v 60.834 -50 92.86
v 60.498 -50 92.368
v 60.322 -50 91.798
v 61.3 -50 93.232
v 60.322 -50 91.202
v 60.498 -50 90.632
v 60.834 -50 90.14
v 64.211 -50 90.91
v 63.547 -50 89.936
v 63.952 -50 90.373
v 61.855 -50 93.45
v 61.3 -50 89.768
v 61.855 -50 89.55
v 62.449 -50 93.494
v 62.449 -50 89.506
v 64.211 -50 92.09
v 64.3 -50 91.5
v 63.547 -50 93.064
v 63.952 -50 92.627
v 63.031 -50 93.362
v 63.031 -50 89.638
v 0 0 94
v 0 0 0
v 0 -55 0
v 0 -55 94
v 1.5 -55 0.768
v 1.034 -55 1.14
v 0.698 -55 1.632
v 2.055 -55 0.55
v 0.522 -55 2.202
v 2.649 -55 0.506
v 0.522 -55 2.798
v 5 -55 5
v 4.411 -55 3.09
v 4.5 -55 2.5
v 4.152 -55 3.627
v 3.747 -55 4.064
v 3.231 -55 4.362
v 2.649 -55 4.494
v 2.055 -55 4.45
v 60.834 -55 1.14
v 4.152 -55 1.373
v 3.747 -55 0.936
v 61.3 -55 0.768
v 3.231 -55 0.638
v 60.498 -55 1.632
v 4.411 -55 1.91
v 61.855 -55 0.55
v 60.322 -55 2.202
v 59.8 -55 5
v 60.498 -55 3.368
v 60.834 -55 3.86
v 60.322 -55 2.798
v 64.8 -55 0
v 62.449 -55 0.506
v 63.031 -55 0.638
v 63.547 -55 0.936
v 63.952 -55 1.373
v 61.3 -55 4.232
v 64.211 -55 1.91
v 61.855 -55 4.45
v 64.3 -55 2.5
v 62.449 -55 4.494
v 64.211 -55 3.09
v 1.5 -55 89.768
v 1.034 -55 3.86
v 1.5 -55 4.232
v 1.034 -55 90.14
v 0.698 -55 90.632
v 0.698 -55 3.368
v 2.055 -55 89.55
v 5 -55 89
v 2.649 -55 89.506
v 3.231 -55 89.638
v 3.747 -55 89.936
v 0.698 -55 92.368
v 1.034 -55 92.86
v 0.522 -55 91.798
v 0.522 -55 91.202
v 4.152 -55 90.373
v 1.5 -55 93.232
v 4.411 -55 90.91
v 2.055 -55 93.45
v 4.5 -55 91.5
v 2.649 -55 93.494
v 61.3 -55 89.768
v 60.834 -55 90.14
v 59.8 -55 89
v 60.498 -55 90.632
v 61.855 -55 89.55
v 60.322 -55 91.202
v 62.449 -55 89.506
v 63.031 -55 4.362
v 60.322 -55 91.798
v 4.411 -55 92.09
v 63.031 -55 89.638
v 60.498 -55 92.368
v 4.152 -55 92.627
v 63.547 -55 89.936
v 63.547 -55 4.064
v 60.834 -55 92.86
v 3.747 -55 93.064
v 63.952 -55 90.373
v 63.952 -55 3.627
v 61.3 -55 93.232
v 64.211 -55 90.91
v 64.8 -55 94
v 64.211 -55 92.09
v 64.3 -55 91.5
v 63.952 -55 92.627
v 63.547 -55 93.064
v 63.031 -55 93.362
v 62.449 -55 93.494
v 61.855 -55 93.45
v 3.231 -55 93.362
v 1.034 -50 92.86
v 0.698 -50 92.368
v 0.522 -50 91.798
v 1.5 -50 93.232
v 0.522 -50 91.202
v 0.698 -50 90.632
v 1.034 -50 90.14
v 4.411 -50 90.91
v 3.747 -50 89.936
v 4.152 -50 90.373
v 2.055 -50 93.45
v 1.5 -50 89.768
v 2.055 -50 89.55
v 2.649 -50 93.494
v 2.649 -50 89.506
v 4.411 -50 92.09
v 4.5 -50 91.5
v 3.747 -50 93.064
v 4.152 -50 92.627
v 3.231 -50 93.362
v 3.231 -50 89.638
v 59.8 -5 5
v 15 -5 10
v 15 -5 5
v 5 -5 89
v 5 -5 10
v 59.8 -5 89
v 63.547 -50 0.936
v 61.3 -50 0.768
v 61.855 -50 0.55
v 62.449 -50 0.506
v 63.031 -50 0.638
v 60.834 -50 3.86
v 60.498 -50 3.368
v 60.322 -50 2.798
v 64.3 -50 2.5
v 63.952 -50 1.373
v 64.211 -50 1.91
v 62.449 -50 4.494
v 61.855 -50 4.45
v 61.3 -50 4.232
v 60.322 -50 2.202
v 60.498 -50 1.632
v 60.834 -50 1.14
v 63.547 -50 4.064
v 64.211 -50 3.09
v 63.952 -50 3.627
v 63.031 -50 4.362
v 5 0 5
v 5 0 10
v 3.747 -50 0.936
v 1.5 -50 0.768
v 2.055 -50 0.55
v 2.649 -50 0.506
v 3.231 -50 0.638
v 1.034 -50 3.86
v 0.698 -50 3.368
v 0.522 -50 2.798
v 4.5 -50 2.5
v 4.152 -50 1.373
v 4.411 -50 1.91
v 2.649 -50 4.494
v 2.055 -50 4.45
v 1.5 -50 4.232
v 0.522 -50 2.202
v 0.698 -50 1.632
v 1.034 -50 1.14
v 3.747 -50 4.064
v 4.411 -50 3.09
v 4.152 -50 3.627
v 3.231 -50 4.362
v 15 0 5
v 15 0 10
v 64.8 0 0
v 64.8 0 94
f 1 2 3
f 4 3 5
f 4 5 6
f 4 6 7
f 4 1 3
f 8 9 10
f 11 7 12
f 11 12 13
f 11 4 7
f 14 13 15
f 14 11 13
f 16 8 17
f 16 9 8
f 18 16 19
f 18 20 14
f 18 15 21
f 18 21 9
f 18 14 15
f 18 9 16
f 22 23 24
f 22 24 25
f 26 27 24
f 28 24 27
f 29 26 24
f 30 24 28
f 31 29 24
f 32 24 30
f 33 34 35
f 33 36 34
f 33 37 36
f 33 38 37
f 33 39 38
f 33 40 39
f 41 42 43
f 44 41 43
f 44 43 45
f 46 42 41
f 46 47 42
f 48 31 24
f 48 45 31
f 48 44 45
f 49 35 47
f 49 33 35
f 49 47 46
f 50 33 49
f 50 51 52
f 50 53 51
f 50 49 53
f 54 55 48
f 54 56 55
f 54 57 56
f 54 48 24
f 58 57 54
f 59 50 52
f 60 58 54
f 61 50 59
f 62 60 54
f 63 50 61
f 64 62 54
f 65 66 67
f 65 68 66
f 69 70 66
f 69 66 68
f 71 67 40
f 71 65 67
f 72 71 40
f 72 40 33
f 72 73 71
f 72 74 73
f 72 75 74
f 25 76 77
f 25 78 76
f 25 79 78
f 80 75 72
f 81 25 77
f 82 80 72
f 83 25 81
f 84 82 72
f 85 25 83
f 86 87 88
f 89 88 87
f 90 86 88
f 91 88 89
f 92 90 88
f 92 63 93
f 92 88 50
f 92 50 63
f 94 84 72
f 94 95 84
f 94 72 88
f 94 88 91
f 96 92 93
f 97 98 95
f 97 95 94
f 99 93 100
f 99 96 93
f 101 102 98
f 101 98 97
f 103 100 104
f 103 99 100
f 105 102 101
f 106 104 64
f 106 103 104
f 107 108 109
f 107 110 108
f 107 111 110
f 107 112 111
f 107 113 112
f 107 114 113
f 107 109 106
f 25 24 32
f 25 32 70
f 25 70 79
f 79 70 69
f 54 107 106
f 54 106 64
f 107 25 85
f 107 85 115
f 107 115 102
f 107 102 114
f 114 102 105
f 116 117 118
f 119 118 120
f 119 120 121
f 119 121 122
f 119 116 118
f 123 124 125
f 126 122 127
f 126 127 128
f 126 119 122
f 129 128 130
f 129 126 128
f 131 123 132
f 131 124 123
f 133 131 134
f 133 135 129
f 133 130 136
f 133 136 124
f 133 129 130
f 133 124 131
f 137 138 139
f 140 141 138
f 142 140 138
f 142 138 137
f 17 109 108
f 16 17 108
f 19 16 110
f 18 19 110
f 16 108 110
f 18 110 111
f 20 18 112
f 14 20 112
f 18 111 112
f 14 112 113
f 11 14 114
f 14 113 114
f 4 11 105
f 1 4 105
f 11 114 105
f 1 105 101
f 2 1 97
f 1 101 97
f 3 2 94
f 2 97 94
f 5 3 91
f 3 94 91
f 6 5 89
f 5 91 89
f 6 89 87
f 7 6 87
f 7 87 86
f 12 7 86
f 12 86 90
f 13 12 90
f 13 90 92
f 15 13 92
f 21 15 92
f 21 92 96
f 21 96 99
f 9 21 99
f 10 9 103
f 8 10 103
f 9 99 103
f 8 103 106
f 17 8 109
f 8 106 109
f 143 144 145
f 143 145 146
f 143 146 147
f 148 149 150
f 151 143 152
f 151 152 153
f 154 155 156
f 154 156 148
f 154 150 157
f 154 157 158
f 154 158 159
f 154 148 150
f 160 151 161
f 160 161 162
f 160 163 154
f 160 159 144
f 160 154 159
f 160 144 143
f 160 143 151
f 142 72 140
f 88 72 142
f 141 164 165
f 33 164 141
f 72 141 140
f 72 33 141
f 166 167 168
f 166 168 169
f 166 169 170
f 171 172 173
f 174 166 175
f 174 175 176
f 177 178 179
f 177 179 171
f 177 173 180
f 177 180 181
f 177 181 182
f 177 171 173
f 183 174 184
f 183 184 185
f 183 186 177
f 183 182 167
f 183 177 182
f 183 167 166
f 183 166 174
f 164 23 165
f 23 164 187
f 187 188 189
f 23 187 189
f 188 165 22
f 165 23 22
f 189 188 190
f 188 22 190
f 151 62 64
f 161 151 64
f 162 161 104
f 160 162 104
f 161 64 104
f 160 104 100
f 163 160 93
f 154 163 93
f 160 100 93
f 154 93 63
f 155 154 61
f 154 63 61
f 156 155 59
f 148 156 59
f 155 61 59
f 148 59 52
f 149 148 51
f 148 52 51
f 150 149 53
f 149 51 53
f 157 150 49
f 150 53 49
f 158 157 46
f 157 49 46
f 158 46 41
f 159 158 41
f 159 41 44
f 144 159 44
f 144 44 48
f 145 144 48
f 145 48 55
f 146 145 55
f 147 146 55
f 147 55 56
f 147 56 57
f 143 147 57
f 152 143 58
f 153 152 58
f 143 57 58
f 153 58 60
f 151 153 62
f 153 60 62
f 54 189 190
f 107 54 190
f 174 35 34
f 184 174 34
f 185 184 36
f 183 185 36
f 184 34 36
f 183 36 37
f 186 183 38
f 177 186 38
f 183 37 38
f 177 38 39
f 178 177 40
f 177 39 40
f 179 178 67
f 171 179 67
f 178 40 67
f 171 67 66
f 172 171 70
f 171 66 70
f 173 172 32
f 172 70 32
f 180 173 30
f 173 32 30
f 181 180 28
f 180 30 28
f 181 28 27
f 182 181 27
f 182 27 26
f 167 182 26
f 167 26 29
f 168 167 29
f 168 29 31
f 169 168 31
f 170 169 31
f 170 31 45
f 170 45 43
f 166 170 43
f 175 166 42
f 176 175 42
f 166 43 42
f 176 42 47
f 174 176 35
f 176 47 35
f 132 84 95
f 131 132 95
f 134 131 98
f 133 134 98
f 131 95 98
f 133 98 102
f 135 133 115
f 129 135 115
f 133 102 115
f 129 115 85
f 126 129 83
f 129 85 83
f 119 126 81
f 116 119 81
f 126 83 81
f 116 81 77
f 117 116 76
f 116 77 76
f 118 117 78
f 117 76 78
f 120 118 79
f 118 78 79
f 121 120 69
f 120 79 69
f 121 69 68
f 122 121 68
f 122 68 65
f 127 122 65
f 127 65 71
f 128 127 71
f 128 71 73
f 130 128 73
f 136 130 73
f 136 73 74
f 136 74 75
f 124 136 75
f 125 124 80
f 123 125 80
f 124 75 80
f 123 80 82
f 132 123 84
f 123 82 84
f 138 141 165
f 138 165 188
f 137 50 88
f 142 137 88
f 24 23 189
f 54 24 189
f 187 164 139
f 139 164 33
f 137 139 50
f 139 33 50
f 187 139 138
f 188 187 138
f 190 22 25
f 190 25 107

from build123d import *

# Parameters (mm, degrees)
SKETCH_W        = 64.8
SKETCH_H        = 94
PAD_DEPTH       = 55
SKETCH001_W     = 54.8
SKETCH001_H     = 84
POCKET_DEPTH    = 50
SKETCH002_R     = 2
POCKET001_DEPTH = 5
SKETCH003_W     = 10
SKETCH003_H     = 5
POCKET002_DEPTH = 5.001


with BuildPart() as part:
    # Sketch → Pad (new body)
    with BuildSketch(Plane.XZ):
        with Locations((32.4, 47)):
            Rectangle(SKETCH_W, SKETCH_H)
    extrude(amount=PAD_DEPTH)

    # Sketch001 (on Face6 of Pad) → Pocket (cut)
    with BuildSketch(Plane.XZ.offset(55)):
        with Locations((32.4, 47)):
            Rectangle(SKETCH001_W, SKETCH001_H)
    extrude(amount=-POCKET_DEPTH, mode=Mode.SUBTRACT)

    # Sketch002 (on Face5 of Pocket) → Pocket001 (cut)
    with BuildSketch(Plane.XZ.offset(55)):
        with Locations((2.5, 2.5)):
            Circle(SKETCH002_R)
        with Locations((62.3, 2.5)):
            Circle(SKETCH002_R)
        with Locations((62.3, 91.5)):
            Circle(SKETCH002_R)
        with Locations((2.5, 91.5)):
            Circle(SKETCH002_R)
    extrude(amount=-POCKET001_DEPTH, mode=Mode.SUBTRACT)

    # Sketch003 (on Face18 of Pocket001) → Pocket002 (cut, through all)
    with BuildSketch(Plane.XZ.offset(5)):
        with Locations((10, 7.5)):
            Rectangle(SKETCH003_W, SKETCH003_H)
    extrude(amount=-POCKET002_DEPTH, mode=Mode.SUBTRACT)


solid = part.part
